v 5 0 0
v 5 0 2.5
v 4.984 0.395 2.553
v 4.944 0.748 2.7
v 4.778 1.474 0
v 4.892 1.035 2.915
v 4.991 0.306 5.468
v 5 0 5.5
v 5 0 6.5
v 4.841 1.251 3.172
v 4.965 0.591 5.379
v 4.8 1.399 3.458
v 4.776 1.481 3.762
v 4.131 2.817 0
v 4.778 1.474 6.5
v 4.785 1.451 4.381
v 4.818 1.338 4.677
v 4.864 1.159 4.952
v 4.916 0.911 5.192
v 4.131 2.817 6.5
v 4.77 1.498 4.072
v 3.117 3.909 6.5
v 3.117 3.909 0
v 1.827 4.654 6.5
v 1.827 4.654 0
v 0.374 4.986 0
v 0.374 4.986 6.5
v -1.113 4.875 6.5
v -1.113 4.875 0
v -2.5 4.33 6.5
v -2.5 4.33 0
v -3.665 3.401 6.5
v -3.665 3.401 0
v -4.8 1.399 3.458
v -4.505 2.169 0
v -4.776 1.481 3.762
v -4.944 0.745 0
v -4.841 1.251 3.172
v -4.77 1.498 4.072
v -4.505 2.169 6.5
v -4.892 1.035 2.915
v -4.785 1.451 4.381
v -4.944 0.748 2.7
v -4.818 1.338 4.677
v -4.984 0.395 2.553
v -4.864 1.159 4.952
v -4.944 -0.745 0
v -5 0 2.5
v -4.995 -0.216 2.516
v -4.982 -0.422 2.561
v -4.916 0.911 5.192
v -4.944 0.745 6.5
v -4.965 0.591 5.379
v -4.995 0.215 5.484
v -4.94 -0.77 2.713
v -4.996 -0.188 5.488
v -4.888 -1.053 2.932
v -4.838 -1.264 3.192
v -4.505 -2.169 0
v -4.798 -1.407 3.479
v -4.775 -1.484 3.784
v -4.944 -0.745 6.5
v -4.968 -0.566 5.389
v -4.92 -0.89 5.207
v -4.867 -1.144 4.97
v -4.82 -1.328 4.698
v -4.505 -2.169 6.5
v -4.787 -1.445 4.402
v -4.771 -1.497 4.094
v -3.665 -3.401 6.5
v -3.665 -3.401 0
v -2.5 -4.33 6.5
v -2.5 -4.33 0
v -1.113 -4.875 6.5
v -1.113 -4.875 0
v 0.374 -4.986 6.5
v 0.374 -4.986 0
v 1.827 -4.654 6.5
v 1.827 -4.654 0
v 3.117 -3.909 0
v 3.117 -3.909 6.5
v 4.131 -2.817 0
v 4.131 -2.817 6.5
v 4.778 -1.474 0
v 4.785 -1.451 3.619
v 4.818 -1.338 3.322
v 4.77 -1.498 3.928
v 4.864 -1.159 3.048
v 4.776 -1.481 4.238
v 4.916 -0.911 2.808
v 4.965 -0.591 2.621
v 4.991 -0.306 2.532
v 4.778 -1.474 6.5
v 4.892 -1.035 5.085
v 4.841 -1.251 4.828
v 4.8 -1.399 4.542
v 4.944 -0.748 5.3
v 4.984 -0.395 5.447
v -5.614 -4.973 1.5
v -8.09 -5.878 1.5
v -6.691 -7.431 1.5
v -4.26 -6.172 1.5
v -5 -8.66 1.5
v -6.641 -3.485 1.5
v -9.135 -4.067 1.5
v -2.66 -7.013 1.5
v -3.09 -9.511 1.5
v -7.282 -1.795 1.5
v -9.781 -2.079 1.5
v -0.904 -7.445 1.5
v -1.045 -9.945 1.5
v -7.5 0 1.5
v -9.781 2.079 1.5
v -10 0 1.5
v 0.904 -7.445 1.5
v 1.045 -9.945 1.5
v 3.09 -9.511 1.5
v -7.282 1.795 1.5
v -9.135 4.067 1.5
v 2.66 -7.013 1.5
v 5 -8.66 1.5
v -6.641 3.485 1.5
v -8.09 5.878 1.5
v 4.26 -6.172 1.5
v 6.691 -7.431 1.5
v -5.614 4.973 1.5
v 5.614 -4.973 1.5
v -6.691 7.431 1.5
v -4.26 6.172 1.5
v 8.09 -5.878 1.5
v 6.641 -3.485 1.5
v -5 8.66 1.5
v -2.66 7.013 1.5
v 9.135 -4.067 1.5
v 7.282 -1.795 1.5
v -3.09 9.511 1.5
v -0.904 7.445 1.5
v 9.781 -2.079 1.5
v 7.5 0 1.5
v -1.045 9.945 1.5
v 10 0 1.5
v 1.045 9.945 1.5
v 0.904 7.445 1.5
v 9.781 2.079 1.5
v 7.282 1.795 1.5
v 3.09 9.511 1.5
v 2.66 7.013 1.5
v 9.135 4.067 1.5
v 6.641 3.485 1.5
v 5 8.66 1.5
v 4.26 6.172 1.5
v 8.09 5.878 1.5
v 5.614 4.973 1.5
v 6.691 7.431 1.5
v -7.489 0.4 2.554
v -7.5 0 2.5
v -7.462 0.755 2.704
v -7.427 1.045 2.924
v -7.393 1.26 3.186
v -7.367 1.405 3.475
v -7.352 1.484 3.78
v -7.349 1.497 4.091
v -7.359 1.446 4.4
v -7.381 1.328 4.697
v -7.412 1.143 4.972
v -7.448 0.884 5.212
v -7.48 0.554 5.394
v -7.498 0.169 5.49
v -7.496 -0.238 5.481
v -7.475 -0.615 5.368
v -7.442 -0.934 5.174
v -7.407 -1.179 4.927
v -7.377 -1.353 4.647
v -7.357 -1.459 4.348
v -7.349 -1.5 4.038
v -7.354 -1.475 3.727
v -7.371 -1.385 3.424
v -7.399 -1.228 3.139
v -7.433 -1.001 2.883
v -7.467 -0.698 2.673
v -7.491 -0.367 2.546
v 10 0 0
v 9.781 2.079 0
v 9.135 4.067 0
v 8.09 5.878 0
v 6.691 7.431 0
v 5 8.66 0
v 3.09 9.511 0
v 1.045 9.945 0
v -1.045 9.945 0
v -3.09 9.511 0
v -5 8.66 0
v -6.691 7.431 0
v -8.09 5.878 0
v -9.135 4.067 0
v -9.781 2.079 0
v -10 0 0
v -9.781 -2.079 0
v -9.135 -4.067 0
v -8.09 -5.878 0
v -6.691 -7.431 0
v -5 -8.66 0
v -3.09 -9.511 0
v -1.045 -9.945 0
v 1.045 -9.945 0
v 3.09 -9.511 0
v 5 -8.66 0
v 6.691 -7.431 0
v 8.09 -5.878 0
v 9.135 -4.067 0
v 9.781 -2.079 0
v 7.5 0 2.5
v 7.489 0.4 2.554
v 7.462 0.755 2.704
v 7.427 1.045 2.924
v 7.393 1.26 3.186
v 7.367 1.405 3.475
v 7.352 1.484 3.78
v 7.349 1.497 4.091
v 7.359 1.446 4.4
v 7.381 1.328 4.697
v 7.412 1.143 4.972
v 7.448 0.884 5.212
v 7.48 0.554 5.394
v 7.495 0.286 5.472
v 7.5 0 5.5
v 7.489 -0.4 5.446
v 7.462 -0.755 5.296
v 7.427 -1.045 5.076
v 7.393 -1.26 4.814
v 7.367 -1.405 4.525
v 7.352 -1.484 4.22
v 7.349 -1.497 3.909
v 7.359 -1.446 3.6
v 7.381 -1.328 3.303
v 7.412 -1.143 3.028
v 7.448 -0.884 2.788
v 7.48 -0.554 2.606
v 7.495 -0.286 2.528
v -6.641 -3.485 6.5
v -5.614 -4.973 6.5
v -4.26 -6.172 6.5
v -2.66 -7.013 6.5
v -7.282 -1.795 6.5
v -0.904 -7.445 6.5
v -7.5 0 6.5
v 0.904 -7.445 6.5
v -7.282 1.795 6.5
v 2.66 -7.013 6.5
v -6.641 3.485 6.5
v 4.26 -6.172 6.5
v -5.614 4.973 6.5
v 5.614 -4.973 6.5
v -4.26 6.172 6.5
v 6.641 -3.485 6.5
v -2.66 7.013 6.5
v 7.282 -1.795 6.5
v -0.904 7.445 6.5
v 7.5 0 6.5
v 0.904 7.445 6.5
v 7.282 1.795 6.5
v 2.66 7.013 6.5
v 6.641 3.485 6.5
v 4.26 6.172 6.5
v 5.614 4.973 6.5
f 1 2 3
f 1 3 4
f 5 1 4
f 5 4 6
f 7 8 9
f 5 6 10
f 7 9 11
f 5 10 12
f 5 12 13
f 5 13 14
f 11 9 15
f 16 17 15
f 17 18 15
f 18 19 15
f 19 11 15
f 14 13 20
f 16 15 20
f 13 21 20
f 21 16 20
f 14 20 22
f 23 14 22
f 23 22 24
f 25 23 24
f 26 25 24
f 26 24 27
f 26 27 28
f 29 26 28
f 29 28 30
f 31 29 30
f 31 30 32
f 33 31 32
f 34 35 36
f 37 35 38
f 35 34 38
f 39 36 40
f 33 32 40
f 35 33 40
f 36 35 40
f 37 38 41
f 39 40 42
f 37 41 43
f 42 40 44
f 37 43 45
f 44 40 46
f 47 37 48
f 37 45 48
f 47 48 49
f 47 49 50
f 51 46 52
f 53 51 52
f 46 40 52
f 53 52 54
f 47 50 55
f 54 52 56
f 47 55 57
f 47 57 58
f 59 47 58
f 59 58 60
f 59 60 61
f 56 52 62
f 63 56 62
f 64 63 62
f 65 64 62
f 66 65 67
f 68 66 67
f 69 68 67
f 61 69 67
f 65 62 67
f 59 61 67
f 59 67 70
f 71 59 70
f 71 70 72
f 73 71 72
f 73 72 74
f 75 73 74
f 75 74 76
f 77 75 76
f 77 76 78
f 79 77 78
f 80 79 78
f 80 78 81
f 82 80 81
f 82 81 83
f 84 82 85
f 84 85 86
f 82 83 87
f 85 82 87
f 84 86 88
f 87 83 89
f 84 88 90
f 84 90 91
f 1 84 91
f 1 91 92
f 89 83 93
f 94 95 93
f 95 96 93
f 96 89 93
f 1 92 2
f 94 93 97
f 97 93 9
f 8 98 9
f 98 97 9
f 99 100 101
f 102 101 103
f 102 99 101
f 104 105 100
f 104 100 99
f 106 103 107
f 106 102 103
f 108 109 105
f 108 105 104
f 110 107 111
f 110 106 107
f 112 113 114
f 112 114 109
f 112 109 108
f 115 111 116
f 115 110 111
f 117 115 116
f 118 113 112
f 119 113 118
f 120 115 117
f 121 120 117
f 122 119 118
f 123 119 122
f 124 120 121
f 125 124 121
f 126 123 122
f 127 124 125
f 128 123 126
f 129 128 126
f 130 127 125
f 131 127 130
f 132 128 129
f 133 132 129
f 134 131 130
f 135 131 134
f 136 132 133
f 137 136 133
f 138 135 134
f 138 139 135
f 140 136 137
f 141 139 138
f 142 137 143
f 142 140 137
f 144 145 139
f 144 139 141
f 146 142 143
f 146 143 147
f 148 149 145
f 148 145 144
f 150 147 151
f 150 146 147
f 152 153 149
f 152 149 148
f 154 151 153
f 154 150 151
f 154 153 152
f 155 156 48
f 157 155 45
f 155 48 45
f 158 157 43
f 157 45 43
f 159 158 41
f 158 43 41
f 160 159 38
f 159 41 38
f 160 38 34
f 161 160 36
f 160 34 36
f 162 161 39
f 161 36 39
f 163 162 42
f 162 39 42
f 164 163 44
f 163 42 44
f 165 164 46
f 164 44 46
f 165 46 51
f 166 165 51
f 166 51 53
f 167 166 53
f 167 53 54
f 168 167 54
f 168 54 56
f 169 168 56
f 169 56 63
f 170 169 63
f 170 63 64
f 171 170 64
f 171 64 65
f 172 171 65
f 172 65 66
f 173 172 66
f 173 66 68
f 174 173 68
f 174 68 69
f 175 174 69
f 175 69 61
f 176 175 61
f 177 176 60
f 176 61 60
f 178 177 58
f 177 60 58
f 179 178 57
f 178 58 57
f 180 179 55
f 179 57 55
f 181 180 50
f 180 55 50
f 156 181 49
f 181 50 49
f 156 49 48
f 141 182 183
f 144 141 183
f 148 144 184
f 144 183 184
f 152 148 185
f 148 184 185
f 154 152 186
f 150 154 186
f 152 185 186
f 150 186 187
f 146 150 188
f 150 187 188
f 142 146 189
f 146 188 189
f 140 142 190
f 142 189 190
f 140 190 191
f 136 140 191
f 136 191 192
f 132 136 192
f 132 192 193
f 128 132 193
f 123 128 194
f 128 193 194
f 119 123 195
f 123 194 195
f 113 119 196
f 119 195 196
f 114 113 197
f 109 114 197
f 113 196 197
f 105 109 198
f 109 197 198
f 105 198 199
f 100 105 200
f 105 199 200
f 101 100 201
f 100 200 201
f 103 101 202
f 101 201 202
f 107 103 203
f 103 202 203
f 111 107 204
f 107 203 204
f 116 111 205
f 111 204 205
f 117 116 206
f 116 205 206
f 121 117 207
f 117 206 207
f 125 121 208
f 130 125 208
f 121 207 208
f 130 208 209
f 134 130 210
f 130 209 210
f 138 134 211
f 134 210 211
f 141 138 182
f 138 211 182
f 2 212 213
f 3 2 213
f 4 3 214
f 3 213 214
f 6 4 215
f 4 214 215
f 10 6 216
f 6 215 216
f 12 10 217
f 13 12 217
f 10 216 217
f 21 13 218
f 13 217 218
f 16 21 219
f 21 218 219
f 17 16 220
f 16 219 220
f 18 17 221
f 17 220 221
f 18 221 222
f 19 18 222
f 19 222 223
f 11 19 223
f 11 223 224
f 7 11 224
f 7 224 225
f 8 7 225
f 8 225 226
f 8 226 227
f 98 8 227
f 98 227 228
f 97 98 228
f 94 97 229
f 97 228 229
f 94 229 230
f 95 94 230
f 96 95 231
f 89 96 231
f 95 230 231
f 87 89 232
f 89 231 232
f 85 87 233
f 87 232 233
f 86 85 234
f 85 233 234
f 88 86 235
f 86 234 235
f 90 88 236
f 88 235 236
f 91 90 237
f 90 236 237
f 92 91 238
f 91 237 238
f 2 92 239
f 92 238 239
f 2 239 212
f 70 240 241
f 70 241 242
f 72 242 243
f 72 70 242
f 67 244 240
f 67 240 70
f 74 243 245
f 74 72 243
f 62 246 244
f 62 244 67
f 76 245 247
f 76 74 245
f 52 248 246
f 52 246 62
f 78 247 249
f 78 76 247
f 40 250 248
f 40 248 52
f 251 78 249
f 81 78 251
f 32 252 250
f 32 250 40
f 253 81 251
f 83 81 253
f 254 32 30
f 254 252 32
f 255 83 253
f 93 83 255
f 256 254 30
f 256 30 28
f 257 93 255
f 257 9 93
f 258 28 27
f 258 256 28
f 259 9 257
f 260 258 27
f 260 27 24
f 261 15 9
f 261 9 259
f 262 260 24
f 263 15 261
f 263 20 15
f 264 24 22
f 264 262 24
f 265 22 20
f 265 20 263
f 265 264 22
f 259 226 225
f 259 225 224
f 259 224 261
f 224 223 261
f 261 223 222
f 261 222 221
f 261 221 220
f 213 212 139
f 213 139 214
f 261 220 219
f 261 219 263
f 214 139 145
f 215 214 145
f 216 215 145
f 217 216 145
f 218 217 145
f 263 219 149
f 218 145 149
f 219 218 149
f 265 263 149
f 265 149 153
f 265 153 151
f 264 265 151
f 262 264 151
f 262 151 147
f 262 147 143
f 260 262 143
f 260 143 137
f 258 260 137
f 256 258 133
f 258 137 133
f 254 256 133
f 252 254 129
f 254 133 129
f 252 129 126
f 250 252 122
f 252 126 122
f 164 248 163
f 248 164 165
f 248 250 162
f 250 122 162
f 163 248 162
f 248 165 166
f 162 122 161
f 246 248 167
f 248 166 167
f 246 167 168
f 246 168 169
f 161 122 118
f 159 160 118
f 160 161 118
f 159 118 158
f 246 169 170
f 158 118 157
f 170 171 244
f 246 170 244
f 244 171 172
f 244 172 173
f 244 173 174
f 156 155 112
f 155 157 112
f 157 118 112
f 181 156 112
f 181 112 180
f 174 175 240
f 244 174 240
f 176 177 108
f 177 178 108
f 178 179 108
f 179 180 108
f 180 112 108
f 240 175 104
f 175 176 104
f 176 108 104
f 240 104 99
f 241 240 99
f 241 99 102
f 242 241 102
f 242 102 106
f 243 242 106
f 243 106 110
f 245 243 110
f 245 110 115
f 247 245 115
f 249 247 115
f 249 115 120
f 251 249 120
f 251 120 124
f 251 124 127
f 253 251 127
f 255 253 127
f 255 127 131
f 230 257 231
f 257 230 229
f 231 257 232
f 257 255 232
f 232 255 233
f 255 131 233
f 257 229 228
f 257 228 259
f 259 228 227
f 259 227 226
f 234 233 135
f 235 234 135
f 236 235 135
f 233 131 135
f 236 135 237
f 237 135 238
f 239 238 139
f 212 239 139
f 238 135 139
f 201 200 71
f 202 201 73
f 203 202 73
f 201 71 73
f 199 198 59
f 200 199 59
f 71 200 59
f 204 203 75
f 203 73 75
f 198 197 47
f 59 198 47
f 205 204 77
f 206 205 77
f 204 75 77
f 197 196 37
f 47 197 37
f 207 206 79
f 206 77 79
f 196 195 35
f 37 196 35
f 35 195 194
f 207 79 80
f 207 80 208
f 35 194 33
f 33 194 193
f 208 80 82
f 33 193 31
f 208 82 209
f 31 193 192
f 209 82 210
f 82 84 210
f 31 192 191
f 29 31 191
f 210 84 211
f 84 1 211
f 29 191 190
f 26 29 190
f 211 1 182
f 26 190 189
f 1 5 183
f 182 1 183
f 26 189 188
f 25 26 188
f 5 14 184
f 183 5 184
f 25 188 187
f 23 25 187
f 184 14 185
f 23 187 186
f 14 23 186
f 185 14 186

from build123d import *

# Parameters (mm, degrees)
SKETCH_1_R          = 10
EXTRUDE_1_DEPTH     = 1.5
SKETCH_2_R          = 7.5
EXTRUDE_2_DEPTH     = 5
SKETCH_3_R          = 5
CUT_EXTRUDE_1_DEPTH = 16.564382416
SKETCH_4_R          = 1.5
CUT_EXTRUDE_2_DEPTH = 22.177818585


with BuildPart() as part:
    # 草图1 → 凸台-拉伸1 (new body)
    with BuildSketch(Plane.XY):
        Circle(SKETCH_1_R)
    extrude(amount=EXTRUDE_1_DEPTH)

    # 草图2 → 凸台-拉伸2 (add)
    with BuildSketch(Plane.XY.offset(1.5)):
        Circle(SKETCH_2_R)
    extrude(amount=EXTRUDE_2_DEPTH)

    # 草图3 → 切除-拉伸1 (cut, through all)
    with BuildSketch(Plane.XY.offset(6.5)):
        Circle(SKETCH_3_R)
    extrude(amount=-CUT_EXTRUDE_1_DEPTH, mode=Mode.SUBTRACT)

    # 草图4 → 切除-拉伸2 (cut, through all)
    with BuildSketch(Plane(origin=(7.5, 0, 0), x_dir=(0, 0, -1), z_dir=(1, 0, 0))):
        with Locations((-4, 0)):
            Circle(SKETCH_4_R)
    extrude(amount=-CUT_EXTRUDE_2_DEPTH, mode=Mode.SUBTRACT)


solid = part.part
